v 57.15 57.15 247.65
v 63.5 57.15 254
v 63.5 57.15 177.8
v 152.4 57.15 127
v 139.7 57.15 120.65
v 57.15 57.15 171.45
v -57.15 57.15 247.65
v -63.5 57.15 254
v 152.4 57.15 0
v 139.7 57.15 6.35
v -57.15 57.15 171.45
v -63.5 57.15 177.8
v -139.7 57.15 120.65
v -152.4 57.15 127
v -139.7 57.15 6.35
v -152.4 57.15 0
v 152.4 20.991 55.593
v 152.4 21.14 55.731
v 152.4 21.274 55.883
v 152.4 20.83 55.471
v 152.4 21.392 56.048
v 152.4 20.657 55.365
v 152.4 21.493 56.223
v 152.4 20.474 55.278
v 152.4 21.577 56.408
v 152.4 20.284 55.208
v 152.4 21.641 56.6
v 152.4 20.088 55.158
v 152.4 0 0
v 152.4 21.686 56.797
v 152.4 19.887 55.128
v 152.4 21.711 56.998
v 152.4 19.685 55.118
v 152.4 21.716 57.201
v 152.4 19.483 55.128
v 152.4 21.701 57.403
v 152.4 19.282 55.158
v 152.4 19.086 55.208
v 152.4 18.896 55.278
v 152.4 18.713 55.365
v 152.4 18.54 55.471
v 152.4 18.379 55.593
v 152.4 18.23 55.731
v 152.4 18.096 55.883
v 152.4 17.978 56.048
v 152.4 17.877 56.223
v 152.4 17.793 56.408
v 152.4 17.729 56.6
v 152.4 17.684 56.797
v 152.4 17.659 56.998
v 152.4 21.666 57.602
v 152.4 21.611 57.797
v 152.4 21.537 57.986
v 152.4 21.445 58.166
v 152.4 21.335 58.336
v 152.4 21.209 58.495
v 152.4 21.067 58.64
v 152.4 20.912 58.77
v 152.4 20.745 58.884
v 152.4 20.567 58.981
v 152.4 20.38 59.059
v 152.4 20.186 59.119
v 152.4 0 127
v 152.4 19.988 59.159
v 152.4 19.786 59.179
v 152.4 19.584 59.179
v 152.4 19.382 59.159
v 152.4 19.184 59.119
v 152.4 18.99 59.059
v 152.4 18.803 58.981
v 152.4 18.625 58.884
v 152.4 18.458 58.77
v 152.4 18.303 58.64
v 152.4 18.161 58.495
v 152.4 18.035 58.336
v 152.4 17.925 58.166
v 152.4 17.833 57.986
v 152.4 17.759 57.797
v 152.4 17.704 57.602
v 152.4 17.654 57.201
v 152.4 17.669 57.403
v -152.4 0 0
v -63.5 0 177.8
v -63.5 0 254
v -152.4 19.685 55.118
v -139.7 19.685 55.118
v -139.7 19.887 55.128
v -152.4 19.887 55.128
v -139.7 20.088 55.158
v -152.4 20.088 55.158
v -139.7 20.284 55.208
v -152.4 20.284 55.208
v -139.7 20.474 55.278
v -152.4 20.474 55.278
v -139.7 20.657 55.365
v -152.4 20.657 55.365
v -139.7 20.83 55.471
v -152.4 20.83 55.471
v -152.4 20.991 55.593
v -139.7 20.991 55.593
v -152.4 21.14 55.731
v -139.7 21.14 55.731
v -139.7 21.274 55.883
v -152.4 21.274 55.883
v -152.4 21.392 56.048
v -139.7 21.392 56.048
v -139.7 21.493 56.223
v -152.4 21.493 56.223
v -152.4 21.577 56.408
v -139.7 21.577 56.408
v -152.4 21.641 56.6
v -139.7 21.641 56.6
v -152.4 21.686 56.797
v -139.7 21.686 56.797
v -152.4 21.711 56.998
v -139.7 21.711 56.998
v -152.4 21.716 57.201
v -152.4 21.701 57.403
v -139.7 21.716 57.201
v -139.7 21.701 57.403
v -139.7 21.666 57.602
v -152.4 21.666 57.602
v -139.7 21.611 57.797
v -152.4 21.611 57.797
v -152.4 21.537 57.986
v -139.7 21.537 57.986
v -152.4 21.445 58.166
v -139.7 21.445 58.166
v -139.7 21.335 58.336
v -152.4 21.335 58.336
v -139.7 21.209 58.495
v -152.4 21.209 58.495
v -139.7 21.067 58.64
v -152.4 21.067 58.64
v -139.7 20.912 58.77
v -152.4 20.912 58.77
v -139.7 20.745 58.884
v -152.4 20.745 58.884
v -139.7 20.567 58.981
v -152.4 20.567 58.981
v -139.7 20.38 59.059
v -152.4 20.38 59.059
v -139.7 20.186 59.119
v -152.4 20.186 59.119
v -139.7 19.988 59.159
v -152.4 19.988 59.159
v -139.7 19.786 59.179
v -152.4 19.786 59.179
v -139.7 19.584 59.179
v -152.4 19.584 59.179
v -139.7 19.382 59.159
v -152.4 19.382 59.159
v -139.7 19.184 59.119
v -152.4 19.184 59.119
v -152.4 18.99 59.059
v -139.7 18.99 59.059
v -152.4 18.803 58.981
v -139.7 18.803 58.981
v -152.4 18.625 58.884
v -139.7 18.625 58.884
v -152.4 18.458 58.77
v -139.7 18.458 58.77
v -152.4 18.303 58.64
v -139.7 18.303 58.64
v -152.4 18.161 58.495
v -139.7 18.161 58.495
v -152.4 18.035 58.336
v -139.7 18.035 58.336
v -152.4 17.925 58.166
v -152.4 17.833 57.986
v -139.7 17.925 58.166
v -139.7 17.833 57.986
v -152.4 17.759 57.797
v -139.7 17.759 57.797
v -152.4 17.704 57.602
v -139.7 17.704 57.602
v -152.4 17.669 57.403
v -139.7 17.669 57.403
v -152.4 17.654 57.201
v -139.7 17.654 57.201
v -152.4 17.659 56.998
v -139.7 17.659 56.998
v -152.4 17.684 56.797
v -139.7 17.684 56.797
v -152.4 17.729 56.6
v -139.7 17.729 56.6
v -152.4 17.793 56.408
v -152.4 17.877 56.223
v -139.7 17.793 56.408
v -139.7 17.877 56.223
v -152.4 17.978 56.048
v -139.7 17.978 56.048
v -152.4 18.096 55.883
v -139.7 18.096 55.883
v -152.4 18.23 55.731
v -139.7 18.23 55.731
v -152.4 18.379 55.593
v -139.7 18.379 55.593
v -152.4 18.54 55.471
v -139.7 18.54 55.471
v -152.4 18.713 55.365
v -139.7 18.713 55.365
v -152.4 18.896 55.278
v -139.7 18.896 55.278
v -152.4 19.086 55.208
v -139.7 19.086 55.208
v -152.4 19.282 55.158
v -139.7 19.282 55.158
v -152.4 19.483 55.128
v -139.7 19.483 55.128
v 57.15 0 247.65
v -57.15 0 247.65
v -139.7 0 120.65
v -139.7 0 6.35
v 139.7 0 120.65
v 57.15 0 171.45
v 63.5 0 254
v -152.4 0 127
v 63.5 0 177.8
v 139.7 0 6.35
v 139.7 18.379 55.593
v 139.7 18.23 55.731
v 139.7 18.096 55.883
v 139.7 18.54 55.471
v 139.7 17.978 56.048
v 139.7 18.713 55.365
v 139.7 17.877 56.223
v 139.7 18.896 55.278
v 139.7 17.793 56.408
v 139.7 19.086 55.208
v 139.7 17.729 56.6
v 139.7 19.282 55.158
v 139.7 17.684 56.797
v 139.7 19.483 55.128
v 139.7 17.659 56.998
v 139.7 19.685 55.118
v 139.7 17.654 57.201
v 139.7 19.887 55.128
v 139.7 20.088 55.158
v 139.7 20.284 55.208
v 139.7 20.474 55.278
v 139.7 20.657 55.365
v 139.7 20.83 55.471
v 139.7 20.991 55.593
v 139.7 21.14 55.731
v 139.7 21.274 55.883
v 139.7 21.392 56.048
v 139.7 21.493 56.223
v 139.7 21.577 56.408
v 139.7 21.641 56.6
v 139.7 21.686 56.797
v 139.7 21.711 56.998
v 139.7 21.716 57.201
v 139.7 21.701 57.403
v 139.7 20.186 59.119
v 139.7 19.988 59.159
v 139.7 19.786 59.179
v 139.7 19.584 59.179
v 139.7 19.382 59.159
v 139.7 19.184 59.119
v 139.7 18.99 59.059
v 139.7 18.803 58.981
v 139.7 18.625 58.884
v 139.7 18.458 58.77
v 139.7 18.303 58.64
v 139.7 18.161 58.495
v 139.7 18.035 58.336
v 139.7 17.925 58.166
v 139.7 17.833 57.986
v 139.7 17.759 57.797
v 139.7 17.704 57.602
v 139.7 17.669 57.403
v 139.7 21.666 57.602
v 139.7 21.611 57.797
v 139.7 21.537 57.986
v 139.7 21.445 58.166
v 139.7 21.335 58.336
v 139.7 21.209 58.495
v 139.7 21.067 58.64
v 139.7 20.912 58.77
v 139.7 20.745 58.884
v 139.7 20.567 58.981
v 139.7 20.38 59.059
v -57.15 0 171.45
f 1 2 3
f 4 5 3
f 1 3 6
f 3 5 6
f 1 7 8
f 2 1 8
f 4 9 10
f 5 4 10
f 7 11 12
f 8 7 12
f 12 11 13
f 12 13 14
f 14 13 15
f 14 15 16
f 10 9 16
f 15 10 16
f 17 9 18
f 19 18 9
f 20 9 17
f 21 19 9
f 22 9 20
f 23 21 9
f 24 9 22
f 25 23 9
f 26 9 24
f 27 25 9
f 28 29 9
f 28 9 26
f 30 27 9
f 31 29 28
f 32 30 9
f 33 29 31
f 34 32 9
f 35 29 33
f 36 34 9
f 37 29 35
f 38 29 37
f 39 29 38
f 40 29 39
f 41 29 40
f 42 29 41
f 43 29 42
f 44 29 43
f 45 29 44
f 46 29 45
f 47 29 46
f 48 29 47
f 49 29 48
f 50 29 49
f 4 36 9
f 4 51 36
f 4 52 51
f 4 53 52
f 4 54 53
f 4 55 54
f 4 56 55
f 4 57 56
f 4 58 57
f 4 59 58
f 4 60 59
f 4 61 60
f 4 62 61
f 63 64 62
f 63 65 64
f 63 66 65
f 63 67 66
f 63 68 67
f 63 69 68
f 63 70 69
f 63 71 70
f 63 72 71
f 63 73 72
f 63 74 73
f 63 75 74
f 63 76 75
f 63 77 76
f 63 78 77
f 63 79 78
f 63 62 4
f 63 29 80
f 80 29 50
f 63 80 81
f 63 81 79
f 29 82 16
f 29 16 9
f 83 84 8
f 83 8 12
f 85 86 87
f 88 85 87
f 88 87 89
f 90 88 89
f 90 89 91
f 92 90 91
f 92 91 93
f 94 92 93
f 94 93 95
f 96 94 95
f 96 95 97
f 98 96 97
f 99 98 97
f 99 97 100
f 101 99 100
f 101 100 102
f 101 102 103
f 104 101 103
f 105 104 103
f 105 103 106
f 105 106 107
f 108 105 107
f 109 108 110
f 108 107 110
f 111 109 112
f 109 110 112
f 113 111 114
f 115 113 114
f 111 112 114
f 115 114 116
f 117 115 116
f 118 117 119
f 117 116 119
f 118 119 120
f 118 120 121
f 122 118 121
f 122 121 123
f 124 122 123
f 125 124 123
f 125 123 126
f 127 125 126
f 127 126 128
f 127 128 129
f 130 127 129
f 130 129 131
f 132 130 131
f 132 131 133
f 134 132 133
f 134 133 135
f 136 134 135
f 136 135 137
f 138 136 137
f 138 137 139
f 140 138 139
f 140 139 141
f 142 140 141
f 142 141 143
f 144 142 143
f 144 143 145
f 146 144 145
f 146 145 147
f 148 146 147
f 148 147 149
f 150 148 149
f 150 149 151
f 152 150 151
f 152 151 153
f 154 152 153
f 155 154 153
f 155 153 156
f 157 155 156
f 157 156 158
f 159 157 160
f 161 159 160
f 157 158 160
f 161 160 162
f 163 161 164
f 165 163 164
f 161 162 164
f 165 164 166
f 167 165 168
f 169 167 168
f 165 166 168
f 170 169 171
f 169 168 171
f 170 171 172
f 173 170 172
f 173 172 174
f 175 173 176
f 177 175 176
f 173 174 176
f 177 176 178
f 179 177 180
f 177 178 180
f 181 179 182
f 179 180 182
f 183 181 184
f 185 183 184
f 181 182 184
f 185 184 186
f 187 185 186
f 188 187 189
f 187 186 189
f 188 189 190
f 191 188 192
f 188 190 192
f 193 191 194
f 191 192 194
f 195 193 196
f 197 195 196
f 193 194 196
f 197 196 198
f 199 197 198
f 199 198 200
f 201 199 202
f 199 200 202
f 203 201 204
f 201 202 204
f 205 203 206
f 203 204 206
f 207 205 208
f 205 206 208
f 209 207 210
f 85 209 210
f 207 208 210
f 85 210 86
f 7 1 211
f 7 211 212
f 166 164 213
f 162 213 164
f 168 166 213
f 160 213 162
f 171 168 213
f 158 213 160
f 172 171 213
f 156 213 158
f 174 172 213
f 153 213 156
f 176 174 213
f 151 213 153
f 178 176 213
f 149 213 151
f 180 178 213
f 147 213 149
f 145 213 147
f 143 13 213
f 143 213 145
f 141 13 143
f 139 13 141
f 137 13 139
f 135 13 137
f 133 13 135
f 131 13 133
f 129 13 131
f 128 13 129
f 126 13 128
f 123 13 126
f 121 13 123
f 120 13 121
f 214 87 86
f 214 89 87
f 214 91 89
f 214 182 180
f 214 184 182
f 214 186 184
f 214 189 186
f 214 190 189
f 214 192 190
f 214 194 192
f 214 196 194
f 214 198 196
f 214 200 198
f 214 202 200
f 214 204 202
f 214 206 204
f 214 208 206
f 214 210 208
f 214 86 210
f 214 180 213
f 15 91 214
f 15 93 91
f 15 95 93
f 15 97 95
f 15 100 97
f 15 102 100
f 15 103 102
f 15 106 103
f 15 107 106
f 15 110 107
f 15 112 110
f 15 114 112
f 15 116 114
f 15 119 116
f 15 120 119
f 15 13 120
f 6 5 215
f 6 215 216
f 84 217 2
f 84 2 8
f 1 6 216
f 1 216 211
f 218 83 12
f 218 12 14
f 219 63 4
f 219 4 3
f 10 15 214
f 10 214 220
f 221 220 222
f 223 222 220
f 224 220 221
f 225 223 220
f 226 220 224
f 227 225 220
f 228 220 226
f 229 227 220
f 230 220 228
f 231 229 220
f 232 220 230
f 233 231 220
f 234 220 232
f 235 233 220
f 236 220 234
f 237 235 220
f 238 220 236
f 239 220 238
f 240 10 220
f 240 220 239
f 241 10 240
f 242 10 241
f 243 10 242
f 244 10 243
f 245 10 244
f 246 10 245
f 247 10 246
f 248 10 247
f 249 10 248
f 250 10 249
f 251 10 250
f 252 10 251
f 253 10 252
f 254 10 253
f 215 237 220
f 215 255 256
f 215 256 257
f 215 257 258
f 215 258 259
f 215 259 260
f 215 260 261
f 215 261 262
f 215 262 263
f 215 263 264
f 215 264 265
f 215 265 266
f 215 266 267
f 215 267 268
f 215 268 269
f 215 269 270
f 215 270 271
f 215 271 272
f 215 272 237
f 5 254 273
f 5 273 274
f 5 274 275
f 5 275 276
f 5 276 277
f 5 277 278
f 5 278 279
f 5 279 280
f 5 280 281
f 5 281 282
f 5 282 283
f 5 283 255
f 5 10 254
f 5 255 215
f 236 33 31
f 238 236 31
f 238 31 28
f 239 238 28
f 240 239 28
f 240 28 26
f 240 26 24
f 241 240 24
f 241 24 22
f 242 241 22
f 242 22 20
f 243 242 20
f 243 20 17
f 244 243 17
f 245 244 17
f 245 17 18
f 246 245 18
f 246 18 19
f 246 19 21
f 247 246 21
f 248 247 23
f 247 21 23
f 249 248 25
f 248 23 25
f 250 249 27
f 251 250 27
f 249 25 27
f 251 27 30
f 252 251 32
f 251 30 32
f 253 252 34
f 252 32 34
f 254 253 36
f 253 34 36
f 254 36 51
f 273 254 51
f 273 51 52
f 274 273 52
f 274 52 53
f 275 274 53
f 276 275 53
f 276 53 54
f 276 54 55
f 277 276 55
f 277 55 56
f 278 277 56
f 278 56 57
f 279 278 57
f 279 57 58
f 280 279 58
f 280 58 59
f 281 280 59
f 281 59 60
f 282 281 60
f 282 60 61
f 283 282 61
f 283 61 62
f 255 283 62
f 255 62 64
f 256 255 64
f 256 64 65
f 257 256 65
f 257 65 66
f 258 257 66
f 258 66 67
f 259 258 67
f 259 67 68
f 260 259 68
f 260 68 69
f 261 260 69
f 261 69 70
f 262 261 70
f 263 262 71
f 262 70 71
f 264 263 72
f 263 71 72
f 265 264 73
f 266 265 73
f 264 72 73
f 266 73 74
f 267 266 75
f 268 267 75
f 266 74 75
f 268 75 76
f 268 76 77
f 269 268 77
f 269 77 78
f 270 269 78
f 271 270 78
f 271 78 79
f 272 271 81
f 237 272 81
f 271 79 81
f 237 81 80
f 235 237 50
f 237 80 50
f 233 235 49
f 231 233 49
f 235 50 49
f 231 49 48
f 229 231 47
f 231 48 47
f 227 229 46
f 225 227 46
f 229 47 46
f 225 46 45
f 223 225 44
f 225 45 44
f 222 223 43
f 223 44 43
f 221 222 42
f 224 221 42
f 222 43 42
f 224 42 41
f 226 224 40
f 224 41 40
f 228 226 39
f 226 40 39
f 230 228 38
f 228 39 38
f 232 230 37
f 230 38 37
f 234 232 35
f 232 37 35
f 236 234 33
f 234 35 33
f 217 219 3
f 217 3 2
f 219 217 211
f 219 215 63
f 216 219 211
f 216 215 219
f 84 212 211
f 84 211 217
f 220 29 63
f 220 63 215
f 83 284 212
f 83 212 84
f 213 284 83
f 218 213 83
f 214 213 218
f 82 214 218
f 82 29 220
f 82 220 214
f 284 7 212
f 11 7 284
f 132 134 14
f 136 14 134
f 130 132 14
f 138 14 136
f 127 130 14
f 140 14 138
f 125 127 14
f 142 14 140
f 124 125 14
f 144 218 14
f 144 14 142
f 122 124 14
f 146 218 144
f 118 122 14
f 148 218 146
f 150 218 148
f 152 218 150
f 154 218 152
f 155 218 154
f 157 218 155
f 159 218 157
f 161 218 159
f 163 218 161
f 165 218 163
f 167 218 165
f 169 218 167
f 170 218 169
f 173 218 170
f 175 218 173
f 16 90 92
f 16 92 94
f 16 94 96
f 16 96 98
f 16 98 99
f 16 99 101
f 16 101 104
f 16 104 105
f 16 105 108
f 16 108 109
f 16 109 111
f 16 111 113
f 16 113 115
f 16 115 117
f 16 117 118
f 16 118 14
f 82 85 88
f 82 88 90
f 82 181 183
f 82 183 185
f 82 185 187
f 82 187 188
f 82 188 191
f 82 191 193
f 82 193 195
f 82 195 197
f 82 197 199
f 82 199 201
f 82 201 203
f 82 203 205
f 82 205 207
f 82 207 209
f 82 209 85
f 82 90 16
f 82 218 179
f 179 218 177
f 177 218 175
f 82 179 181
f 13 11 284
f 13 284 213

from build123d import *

# Parameters (mm, degrees)
BOSS_EXTRUDE1_DEPTH = 57.15
CUT_EXTRUDE1_DEPTH  = 57.15
SKETCH3_R           = 2.032
CUT_EXTRUDE2_DEPTH  = 401.855538193


with BuildPart() as part:
    # Sketch1 → Boss-Extrude1 (new body)
    with BuildSketch(Plane(origin=(0, 0, 0), x_dir=(1, 0, 0), z_dir=(0, 1, 0))):
        Polygon((-152.4, 0), (152.4, 0), (152.4, -127), (63.5, -177.8), (63.5, -254), (-63.5, -254), (-63.5, -177.8), (-152.4, -127), align=None)
    extrude(amount=BOSS_EXTRUDE1_DEPTH)

    # Sketch2 → Cut-Extrude1 (cut)
    with BuildSketch(Plane(origin=(0, 57.15, 0), x_dir=(1, 0, 0), z_dir=(0, 1, 0))):
        Polygon((-139.7, -6.35), (139.7, -6.35), (139.7, -120.65), (57.15, -171.45), (57.15, -247.65), (-57.15, -247.65), (-57.15, -171.45), (-139.7, -120.65), align=None)
    extrude(amount=-CUT_EXTRUDE1_DEPTH, mode=Mode.SUBTRACT)

    # Sketch3 → Cut-Extrude2 (cut, through all)
    with BuildSketch(Plane(origin=(152.4, 0, 0), x_dir=(0, 0, -1), z_dir=(1, 0, 0))):
        with Locations((-57.15, 19.685)):
            Circle(SKETCH3_R)
    extrude(amount=-CUT_EXTRUDE2_DEPTH, mode=Mode.SUBTRACT)


solid = part.part
